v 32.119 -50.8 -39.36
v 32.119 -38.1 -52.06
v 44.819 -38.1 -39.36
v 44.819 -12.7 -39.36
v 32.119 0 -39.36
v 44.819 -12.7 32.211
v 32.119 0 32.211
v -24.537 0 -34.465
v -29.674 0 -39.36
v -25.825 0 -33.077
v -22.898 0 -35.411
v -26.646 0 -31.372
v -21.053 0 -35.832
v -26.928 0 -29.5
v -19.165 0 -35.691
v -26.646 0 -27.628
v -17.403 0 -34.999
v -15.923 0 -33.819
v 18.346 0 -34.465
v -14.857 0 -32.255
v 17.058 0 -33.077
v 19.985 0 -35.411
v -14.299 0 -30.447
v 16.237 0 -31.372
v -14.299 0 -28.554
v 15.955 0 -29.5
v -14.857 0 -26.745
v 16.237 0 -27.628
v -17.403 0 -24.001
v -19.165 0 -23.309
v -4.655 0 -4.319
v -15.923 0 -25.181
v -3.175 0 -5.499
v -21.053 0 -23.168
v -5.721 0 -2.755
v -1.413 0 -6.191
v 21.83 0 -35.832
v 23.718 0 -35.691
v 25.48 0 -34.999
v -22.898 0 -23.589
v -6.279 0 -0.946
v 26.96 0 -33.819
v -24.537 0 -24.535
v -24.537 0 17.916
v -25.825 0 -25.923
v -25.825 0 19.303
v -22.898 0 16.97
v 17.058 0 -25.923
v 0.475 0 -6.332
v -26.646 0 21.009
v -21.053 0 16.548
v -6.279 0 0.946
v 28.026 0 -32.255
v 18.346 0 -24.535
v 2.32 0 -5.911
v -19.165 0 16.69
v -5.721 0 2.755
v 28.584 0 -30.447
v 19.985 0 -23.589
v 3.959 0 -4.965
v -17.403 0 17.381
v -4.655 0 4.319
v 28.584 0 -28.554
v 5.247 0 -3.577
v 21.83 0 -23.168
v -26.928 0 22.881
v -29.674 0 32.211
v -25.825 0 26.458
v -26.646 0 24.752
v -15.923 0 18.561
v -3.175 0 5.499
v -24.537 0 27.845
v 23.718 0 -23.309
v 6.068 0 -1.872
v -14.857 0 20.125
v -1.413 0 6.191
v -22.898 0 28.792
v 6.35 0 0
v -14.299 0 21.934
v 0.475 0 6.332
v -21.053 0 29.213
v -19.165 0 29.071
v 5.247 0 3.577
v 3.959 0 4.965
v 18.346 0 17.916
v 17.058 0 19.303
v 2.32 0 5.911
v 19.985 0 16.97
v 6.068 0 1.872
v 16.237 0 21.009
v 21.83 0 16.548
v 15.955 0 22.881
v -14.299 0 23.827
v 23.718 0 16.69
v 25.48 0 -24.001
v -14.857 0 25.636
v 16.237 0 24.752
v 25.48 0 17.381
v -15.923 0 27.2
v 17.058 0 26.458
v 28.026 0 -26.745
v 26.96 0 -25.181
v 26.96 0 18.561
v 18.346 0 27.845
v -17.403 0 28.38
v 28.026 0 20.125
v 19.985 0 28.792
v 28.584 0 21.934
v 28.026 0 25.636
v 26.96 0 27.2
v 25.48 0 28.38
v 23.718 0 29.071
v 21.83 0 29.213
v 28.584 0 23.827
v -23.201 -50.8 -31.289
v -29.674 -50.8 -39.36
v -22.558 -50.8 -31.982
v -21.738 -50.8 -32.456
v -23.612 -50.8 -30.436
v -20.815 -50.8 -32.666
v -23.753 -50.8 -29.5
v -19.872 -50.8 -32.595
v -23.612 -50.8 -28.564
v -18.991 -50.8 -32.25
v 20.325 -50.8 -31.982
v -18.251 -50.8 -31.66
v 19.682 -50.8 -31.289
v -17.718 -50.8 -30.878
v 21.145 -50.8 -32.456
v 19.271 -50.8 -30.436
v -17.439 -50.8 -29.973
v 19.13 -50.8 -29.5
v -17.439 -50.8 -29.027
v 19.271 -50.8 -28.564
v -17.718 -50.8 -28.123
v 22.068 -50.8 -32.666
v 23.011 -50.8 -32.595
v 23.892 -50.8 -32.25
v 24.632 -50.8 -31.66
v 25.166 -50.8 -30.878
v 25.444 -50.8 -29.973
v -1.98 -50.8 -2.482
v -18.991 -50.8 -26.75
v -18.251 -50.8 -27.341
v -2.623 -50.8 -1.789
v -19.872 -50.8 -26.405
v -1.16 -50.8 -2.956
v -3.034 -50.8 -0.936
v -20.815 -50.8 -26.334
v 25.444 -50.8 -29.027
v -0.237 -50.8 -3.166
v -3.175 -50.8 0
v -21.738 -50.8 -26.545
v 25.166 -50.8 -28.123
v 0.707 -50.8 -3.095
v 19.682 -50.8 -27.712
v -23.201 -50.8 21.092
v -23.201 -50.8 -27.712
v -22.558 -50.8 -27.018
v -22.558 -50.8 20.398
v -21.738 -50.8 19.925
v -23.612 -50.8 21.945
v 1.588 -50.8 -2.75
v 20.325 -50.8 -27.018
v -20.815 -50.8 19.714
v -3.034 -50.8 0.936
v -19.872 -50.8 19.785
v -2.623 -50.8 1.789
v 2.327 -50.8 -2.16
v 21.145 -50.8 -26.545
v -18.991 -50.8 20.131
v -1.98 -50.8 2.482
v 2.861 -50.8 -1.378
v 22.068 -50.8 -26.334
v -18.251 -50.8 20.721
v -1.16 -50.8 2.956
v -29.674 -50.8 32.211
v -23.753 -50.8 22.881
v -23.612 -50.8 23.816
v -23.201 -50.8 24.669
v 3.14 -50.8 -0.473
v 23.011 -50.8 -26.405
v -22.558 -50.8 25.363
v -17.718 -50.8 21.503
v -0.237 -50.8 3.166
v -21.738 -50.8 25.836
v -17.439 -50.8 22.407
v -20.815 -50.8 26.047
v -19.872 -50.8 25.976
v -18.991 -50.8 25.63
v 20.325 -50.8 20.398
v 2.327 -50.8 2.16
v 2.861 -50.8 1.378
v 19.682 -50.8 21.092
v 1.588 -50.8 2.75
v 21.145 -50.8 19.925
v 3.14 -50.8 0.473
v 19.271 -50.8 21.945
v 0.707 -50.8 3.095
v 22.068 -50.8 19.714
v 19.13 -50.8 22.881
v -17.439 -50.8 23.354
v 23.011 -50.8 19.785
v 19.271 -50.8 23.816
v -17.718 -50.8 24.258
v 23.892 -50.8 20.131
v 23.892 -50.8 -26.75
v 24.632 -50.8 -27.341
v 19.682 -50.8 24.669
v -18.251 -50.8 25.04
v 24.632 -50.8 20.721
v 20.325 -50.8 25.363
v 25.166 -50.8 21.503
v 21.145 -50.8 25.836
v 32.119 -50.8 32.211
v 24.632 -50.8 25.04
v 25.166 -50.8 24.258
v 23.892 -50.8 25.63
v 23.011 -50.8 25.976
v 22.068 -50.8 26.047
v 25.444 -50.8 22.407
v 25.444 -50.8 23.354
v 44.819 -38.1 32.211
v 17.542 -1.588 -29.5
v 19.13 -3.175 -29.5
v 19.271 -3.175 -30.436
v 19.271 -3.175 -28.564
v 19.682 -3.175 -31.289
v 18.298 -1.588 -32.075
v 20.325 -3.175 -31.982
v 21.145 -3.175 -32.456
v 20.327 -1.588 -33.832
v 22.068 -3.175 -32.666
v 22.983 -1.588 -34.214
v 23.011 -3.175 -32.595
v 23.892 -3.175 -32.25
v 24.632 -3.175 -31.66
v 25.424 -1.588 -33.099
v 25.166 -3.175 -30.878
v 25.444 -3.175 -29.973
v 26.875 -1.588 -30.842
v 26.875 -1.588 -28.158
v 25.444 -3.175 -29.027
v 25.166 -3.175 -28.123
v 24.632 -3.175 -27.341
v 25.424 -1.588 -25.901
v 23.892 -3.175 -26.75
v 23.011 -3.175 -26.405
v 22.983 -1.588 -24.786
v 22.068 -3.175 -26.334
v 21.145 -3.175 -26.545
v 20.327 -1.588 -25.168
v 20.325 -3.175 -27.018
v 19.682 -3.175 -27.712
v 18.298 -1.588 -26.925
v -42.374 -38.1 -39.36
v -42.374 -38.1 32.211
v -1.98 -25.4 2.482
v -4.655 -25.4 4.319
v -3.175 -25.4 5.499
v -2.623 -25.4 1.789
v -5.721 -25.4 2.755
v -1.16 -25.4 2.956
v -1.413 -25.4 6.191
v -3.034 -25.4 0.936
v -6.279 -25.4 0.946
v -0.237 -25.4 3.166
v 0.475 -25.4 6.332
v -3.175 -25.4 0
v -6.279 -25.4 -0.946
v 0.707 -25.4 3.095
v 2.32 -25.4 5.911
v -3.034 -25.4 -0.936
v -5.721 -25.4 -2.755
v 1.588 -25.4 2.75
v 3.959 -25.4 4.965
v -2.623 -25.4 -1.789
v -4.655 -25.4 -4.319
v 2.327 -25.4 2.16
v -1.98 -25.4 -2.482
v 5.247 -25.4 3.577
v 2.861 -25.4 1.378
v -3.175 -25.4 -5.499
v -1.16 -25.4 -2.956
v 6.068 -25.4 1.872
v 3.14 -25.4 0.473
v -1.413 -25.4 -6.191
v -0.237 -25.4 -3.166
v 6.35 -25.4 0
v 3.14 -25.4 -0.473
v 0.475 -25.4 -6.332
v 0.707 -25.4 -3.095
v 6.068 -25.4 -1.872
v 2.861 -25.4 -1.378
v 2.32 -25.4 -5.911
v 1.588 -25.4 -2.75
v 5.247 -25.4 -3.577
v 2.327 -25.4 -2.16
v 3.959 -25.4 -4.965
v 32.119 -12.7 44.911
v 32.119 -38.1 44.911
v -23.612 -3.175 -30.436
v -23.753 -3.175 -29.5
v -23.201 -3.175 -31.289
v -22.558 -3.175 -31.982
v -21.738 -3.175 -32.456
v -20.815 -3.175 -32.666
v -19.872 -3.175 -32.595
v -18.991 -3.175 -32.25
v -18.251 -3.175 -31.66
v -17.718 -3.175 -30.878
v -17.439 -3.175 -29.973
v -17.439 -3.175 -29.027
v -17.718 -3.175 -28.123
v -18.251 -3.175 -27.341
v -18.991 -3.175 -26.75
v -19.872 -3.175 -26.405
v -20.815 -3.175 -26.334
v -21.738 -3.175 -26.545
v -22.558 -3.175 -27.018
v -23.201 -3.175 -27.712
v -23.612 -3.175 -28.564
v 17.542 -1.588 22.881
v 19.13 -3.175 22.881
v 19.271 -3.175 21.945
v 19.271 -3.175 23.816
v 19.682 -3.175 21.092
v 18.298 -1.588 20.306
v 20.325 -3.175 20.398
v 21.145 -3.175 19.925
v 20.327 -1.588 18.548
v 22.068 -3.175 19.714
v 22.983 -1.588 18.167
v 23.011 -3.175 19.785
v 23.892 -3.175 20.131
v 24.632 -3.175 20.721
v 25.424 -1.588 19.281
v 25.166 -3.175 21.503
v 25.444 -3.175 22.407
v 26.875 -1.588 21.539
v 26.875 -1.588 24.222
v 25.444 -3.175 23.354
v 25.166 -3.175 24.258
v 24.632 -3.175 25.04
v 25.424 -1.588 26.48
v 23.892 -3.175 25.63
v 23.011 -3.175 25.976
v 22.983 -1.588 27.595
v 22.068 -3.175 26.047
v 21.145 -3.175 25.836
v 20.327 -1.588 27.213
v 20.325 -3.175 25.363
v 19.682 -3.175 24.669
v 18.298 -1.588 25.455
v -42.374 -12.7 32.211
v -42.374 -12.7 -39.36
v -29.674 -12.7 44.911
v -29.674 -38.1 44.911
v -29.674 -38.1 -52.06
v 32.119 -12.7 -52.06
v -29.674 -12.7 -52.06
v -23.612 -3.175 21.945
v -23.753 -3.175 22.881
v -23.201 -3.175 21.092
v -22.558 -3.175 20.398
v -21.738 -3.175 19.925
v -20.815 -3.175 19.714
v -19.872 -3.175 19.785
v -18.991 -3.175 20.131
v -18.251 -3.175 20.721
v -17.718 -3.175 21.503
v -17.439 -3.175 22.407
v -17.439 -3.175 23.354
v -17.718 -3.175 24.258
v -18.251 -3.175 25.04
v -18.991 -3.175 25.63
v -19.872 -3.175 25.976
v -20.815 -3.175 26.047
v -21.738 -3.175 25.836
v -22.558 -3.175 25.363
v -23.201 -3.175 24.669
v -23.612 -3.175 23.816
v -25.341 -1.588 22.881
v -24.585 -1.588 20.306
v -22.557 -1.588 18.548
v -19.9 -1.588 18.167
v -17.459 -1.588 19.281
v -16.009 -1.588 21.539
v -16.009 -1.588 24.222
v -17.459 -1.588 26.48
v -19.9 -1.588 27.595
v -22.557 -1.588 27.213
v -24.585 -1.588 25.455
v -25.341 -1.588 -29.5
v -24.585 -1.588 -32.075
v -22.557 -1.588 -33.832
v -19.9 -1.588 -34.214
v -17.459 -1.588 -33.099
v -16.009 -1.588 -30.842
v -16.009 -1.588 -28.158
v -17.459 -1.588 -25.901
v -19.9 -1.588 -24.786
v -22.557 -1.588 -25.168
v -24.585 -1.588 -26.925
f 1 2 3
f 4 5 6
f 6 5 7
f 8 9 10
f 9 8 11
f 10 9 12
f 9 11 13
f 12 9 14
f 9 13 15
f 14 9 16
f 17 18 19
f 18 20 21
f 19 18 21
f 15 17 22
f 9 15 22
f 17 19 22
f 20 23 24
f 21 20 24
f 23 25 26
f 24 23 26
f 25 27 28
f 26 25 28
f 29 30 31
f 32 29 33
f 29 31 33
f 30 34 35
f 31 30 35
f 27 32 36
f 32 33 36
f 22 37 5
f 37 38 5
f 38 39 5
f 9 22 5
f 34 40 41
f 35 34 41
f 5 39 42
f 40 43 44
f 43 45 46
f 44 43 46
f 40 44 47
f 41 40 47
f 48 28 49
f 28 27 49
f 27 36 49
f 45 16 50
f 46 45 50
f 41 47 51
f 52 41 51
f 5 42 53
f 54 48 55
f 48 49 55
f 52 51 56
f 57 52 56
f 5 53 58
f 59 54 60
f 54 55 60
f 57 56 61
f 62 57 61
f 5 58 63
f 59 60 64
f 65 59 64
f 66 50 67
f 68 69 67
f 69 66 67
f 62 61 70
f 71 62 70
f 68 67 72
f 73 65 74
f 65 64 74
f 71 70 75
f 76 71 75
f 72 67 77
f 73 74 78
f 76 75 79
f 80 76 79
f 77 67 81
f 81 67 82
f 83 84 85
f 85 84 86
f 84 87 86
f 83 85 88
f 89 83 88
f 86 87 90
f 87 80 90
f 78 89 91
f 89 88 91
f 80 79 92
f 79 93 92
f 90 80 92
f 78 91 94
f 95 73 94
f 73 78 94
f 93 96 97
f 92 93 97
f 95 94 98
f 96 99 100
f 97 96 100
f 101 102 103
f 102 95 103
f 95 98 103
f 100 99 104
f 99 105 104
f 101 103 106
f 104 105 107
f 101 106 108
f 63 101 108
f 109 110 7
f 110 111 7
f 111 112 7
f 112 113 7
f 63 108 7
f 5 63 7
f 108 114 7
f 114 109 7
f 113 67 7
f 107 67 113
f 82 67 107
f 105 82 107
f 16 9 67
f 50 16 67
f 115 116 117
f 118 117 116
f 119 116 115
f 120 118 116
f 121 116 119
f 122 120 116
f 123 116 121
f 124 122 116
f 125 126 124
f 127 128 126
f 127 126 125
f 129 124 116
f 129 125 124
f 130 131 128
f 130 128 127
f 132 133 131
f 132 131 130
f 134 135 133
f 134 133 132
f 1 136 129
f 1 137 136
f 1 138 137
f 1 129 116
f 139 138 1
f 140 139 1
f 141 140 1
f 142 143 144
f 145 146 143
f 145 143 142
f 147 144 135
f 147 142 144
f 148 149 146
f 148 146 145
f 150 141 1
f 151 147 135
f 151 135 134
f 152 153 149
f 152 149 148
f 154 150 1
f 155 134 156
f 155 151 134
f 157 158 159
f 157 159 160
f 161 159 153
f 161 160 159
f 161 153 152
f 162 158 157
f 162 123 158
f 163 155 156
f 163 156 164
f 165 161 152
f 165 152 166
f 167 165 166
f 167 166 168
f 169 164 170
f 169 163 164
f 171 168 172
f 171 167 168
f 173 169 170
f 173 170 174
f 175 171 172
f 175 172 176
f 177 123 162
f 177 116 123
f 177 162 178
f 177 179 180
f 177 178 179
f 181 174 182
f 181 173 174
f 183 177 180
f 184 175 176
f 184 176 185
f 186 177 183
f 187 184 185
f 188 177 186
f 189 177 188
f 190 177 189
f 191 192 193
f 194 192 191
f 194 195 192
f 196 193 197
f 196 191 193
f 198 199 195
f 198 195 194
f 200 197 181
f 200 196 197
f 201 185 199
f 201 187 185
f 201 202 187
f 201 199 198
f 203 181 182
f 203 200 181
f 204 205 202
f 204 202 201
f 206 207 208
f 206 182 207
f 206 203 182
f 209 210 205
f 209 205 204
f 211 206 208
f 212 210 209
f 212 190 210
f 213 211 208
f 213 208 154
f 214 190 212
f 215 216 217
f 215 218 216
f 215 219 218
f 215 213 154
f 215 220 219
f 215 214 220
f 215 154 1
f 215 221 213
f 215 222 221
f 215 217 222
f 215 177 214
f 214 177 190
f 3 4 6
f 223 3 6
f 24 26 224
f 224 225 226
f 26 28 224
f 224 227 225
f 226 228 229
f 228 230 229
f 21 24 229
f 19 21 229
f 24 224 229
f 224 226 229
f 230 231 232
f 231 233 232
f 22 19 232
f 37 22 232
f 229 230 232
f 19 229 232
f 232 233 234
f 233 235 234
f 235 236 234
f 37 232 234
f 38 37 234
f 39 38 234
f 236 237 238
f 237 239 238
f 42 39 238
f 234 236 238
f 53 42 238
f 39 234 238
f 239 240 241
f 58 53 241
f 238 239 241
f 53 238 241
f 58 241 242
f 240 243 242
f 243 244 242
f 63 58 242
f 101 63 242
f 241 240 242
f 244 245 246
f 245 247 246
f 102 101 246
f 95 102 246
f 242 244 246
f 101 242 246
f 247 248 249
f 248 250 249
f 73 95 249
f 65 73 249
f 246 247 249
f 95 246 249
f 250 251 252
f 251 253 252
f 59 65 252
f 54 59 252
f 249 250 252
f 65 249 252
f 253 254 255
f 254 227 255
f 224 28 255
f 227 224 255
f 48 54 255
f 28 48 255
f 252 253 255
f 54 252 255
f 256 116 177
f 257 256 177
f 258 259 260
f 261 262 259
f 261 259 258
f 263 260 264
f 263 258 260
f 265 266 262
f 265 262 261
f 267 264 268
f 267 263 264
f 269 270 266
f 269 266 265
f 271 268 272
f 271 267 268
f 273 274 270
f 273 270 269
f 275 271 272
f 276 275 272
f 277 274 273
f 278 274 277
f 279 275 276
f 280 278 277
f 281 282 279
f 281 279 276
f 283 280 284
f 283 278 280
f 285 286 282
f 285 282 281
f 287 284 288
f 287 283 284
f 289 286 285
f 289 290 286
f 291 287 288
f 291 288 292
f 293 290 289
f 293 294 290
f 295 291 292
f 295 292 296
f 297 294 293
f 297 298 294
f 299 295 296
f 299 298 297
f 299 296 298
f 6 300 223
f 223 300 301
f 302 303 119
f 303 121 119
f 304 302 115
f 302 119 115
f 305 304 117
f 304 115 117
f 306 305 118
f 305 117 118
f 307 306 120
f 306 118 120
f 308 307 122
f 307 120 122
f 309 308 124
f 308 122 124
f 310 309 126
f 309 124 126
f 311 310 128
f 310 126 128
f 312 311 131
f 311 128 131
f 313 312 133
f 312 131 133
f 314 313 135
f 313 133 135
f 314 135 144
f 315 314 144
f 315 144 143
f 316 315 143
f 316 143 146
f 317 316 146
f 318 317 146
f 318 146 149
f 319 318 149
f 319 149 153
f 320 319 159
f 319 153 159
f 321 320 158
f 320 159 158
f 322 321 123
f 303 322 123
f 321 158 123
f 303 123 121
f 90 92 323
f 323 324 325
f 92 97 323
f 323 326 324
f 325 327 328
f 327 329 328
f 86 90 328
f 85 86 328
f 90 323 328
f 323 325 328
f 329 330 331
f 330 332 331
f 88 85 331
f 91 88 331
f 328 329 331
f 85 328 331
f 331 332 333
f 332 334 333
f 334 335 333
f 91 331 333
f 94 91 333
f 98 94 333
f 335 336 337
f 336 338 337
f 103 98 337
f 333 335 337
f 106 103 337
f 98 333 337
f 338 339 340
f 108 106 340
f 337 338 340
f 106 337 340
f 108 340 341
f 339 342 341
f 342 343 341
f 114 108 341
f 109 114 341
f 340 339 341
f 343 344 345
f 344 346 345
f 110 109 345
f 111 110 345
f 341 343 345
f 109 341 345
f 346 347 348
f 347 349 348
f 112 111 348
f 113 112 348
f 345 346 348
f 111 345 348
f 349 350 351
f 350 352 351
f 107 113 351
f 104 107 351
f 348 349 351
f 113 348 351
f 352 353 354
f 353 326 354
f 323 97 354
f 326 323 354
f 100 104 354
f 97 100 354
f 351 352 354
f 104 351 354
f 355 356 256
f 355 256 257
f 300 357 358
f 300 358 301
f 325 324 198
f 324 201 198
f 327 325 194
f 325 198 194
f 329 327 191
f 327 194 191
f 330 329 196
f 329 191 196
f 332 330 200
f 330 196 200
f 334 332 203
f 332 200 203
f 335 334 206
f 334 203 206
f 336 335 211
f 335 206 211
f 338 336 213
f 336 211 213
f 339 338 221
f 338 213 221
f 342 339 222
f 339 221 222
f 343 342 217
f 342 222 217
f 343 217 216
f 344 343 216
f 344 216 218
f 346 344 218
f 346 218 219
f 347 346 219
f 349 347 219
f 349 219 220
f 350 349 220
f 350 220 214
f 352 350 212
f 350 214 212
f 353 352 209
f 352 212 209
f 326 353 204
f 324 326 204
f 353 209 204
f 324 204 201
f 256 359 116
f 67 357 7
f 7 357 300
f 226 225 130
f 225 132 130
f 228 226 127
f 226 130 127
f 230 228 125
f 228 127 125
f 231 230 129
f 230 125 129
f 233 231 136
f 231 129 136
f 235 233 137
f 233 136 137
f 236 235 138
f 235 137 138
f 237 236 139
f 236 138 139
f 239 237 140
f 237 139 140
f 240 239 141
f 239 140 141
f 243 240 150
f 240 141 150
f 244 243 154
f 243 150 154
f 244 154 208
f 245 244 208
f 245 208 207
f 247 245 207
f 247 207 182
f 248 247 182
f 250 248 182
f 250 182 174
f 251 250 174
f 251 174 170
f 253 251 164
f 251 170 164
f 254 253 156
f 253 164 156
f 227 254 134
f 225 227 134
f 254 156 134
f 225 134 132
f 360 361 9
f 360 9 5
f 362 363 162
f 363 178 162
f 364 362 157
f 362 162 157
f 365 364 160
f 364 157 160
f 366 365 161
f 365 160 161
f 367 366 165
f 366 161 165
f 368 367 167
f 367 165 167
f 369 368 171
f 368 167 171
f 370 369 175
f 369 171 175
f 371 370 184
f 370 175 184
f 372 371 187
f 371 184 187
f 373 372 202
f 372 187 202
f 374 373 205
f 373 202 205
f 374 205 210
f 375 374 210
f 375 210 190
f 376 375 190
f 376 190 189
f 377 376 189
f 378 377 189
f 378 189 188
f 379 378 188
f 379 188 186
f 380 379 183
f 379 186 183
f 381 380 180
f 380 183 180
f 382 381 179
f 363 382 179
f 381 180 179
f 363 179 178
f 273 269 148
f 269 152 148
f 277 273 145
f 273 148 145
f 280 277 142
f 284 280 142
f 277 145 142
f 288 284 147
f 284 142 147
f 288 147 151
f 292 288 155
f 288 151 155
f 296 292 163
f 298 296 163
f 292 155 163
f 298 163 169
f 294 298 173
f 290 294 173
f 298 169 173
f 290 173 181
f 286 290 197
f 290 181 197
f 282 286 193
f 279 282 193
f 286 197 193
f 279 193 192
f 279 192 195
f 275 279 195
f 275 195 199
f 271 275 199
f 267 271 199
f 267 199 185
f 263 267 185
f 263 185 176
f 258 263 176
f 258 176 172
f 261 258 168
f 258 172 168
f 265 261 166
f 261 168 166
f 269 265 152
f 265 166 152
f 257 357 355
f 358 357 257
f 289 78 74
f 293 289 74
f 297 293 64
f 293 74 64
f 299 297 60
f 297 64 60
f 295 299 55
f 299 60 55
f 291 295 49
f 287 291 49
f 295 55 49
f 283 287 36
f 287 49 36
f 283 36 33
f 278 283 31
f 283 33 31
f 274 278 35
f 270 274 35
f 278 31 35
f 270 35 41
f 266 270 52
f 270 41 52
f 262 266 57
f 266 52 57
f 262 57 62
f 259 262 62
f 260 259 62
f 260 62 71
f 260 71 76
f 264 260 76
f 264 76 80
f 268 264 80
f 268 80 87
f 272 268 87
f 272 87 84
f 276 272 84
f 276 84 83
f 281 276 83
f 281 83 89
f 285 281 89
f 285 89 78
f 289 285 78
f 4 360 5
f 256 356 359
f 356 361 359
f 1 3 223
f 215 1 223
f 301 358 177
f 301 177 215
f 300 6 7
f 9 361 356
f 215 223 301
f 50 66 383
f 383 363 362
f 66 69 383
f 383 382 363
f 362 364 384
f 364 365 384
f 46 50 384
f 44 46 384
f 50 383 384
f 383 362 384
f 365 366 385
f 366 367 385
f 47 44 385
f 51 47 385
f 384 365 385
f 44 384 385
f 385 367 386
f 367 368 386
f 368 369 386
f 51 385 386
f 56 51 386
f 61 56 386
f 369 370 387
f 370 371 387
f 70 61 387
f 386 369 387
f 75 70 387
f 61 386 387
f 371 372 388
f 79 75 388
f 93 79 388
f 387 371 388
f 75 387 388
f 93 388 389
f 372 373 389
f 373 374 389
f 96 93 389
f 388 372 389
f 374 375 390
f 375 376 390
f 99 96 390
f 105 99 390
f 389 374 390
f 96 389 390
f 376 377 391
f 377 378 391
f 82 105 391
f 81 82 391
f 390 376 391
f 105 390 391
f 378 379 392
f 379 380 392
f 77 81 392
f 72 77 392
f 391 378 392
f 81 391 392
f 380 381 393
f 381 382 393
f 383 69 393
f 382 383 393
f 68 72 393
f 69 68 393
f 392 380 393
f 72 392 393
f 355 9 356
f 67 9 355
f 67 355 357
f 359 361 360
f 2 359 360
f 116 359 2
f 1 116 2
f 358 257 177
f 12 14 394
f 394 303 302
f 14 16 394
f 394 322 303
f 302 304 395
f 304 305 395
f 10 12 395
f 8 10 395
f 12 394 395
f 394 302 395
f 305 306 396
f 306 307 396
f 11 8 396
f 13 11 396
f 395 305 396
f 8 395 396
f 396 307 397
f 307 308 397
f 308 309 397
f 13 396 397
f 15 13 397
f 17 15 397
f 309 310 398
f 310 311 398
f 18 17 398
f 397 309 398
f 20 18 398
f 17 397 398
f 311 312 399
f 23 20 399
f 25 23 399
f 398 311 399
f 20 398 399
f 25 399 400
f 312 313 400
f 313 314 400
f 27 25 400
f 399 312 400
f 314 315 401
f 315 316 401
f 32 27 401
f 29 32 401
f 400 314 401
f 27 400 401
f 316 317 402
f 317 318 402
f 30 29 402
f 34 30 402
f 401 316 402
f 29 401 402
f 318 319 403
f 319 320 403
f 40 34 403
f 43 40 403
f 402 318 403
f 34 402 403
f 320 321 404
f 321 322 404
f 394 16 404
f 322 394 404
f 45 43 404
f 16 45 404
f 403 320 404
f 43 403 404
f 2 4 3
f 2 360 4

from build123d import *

# Parameters (mm, degrees)
F0_W           = 87.1929600835
F0_H           = 96.9703122973
F1_DEPTH       = 50.8
F3_D           = 6.35
F3_CBORE_D     = 12.7
F3_CBORE_DEPTH = 25.4
F5_D           = 6.35
F5_CSINK_D     = 12.7
F5_CSINK_ANGLE = 90
F6_SIZE        = 12.7


# Not quite as in the source:
# - a feature names something its author has since deleted; it is built from what else it names


with BuildPart() as f1:
    # F0 (on Front) → F1 (new body)
    with BuildSketch(Plane.XZ):
        with Locations((1.2225024402, -3.5745240748)):
            Rectangle(F0_W, F0_H)
    extrude(amount=F1_DEPTH)

    # F3 (through all)
    with Locations(Plane(origin=(0, 0, 0), x_dir=(1, 0, 0), z_dir=(0, 1, 0))):
        with Locations((0, 0)):
            CounterBoreHole(F3_D / 2, F3_CBORE_D / 2, F3_CBORE_DEPTH)

    # F5 (through all)
    with Locations(Plane(origin=(0, 0, 0), x_dir=(1, 0, 0), z_dir=(0, 1, 0))):
        with Locations((22.3049465567, -22.8805579245), (-20.5781124532, -22.8805579245), (-20.5781124532, 29.5000895858), (22.3049465567, 29.5000895858)):
            CounterSinkHole(F5_D / 2, F5_CSINK_D / 2, counter_sink_angle=F5_CSINK_ANGLE)

    # F6
    f6_edges = [f1.edges().sort_by_distance(p)[0] for p in [
        (-42.373978, -25.4, -52.05968),
        (44.818982, -25.4, -52.05968),
        (1.222502, 0, -52.05968),
        (1.222502, -50.8, -52.05968),
        (-42.373978, -25.4, 44.910632),
        (-42.373978, 0, -3.574524),
        (-42.373978, -50.8, -3.574524),
        (44.818982, -25.4, 44.910632),
        (44.818982, 0, -3.574524),
        (44.818982, -50.8, -3.574524),
        (1.222502, 0, 44.910632),
        (1.222502, -50.8, 44.910632),
    ]]
    chamfer(f6_edges, length=F6_SIZE)


solid = f1.part
